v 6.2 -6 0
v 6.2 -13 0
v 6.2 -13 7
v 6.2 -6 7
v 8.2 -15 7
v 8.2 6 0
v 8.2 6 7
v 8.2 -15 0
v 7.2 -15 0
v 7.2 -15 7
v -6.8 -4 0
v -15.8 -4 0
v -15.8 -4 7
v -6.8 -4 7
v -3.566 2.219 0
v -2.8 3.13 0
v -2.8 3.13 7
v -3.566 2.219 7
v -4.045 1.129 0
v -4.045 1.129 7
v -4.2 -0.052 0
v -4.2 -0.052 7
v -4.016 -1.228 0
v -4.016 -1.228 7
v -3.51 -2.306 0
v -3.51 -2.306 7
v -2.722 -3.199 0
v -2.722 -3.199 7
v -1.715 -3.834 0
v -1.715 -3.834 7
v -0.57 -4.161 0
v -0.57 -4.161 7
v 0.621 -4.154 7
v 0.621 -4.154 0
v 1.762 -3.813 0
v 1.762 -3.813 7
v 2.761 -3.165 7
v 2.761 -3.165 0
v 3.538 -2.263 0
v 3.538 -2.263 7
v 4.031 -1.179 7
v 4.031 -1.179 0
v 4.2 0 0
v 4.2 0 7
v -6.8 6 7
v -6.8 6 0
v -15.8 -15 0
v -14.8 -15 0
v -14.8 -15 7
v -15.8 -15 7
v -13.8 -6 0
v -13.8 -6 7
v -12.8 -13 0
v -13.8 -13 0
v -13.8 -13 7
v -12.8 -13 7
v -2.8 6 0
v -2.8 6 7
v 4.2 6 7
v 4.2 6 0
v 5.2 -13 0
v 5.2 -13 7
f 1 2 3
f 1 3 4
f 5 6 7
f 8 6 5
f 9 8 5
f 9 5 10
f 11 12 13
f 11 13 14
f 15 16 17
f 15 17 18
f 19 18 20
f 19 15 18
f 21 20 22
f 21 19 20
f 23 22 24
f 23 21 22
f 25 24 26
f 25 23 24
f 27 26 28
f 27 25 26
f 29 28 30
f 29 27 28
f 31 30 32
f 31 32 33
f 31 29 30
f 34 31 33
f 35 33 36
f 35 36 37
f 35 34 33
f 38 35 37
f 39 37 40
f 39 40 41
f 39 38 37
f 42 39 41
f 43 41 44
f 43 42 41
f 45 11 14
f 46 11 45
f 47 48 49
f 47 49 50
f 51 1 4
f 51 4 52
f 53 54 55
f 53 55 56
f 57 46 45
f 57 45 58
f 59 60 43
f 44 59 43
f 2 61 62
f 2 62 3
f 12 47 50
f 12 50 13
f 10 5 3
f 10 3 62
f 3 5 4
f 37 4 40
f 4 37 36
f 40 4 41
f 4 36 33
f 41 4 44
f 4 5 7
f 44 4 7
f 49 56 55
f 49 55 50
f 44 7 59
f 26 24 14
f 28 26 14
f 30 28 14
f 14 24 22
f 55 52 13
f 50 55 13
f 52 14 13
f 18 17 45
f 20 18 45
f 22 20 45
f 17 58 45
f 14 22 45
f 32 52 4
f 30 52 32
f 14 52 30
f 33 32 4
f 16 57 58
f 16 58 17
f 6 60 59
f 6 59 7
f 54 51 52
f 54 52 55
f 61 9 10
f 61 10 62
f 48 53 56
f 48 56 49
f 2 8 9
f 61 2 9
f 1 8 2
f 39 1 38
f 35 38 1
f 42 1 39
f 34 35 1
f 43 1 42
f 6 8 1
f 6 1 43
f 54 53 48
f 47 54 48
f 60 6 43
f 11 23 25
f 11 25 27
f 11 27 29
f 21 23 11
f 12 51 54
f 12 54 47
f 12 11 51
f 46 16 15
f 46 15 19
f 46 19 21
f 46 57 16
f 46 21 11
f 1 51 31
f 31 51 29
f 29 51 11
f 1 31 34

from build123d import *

# Parameters (mm, degrees)
PAD_DEPTH = 7


with BuildPart() as part:
    # Sketch → Pad (new body)
    with BuildSketch(Plane.XY):
        with BuildLine():
            ThreePointArc((-2.8, 3.130495), (-1.714643, -3.834058), (4.2, 0))
            Line((4.2, 6), (4.2, 0))
            Line((4.2, 6), (8.2, 6))
            Line((8.2, 6), (8.2, -15))
            Line((8.2, -15), (7.2, -15))
            Line((7.2, -15), (5.2, -13))
            Line((5.2, -13), (6.2, -13))
            Line((6.2, -13), (6.2, -6))
            Line((6.2, -6), (-13.8, -6))
            Line((-13.8, -6), (-13.8, -13))
            Line((-13.8, -13), (-12.8, -13))
            Line((-12.8, -13), (-14.8, -15))
            Line((-14.8, -15), (-15.8, -15))
            Line((-15.8, -15), (-15.8, -4))
            Line((-15.8, -4), (-6.8, -4))
            Line((-6.8, -4), (-6.8, 6))
            Line((-6.8, 6), (-2.8, 6))
            Line((-2.8, 6), (-2.8, 3.130495))
        make_face()
    extrude(amount=PAD_DEPTH)


solid = part.part
